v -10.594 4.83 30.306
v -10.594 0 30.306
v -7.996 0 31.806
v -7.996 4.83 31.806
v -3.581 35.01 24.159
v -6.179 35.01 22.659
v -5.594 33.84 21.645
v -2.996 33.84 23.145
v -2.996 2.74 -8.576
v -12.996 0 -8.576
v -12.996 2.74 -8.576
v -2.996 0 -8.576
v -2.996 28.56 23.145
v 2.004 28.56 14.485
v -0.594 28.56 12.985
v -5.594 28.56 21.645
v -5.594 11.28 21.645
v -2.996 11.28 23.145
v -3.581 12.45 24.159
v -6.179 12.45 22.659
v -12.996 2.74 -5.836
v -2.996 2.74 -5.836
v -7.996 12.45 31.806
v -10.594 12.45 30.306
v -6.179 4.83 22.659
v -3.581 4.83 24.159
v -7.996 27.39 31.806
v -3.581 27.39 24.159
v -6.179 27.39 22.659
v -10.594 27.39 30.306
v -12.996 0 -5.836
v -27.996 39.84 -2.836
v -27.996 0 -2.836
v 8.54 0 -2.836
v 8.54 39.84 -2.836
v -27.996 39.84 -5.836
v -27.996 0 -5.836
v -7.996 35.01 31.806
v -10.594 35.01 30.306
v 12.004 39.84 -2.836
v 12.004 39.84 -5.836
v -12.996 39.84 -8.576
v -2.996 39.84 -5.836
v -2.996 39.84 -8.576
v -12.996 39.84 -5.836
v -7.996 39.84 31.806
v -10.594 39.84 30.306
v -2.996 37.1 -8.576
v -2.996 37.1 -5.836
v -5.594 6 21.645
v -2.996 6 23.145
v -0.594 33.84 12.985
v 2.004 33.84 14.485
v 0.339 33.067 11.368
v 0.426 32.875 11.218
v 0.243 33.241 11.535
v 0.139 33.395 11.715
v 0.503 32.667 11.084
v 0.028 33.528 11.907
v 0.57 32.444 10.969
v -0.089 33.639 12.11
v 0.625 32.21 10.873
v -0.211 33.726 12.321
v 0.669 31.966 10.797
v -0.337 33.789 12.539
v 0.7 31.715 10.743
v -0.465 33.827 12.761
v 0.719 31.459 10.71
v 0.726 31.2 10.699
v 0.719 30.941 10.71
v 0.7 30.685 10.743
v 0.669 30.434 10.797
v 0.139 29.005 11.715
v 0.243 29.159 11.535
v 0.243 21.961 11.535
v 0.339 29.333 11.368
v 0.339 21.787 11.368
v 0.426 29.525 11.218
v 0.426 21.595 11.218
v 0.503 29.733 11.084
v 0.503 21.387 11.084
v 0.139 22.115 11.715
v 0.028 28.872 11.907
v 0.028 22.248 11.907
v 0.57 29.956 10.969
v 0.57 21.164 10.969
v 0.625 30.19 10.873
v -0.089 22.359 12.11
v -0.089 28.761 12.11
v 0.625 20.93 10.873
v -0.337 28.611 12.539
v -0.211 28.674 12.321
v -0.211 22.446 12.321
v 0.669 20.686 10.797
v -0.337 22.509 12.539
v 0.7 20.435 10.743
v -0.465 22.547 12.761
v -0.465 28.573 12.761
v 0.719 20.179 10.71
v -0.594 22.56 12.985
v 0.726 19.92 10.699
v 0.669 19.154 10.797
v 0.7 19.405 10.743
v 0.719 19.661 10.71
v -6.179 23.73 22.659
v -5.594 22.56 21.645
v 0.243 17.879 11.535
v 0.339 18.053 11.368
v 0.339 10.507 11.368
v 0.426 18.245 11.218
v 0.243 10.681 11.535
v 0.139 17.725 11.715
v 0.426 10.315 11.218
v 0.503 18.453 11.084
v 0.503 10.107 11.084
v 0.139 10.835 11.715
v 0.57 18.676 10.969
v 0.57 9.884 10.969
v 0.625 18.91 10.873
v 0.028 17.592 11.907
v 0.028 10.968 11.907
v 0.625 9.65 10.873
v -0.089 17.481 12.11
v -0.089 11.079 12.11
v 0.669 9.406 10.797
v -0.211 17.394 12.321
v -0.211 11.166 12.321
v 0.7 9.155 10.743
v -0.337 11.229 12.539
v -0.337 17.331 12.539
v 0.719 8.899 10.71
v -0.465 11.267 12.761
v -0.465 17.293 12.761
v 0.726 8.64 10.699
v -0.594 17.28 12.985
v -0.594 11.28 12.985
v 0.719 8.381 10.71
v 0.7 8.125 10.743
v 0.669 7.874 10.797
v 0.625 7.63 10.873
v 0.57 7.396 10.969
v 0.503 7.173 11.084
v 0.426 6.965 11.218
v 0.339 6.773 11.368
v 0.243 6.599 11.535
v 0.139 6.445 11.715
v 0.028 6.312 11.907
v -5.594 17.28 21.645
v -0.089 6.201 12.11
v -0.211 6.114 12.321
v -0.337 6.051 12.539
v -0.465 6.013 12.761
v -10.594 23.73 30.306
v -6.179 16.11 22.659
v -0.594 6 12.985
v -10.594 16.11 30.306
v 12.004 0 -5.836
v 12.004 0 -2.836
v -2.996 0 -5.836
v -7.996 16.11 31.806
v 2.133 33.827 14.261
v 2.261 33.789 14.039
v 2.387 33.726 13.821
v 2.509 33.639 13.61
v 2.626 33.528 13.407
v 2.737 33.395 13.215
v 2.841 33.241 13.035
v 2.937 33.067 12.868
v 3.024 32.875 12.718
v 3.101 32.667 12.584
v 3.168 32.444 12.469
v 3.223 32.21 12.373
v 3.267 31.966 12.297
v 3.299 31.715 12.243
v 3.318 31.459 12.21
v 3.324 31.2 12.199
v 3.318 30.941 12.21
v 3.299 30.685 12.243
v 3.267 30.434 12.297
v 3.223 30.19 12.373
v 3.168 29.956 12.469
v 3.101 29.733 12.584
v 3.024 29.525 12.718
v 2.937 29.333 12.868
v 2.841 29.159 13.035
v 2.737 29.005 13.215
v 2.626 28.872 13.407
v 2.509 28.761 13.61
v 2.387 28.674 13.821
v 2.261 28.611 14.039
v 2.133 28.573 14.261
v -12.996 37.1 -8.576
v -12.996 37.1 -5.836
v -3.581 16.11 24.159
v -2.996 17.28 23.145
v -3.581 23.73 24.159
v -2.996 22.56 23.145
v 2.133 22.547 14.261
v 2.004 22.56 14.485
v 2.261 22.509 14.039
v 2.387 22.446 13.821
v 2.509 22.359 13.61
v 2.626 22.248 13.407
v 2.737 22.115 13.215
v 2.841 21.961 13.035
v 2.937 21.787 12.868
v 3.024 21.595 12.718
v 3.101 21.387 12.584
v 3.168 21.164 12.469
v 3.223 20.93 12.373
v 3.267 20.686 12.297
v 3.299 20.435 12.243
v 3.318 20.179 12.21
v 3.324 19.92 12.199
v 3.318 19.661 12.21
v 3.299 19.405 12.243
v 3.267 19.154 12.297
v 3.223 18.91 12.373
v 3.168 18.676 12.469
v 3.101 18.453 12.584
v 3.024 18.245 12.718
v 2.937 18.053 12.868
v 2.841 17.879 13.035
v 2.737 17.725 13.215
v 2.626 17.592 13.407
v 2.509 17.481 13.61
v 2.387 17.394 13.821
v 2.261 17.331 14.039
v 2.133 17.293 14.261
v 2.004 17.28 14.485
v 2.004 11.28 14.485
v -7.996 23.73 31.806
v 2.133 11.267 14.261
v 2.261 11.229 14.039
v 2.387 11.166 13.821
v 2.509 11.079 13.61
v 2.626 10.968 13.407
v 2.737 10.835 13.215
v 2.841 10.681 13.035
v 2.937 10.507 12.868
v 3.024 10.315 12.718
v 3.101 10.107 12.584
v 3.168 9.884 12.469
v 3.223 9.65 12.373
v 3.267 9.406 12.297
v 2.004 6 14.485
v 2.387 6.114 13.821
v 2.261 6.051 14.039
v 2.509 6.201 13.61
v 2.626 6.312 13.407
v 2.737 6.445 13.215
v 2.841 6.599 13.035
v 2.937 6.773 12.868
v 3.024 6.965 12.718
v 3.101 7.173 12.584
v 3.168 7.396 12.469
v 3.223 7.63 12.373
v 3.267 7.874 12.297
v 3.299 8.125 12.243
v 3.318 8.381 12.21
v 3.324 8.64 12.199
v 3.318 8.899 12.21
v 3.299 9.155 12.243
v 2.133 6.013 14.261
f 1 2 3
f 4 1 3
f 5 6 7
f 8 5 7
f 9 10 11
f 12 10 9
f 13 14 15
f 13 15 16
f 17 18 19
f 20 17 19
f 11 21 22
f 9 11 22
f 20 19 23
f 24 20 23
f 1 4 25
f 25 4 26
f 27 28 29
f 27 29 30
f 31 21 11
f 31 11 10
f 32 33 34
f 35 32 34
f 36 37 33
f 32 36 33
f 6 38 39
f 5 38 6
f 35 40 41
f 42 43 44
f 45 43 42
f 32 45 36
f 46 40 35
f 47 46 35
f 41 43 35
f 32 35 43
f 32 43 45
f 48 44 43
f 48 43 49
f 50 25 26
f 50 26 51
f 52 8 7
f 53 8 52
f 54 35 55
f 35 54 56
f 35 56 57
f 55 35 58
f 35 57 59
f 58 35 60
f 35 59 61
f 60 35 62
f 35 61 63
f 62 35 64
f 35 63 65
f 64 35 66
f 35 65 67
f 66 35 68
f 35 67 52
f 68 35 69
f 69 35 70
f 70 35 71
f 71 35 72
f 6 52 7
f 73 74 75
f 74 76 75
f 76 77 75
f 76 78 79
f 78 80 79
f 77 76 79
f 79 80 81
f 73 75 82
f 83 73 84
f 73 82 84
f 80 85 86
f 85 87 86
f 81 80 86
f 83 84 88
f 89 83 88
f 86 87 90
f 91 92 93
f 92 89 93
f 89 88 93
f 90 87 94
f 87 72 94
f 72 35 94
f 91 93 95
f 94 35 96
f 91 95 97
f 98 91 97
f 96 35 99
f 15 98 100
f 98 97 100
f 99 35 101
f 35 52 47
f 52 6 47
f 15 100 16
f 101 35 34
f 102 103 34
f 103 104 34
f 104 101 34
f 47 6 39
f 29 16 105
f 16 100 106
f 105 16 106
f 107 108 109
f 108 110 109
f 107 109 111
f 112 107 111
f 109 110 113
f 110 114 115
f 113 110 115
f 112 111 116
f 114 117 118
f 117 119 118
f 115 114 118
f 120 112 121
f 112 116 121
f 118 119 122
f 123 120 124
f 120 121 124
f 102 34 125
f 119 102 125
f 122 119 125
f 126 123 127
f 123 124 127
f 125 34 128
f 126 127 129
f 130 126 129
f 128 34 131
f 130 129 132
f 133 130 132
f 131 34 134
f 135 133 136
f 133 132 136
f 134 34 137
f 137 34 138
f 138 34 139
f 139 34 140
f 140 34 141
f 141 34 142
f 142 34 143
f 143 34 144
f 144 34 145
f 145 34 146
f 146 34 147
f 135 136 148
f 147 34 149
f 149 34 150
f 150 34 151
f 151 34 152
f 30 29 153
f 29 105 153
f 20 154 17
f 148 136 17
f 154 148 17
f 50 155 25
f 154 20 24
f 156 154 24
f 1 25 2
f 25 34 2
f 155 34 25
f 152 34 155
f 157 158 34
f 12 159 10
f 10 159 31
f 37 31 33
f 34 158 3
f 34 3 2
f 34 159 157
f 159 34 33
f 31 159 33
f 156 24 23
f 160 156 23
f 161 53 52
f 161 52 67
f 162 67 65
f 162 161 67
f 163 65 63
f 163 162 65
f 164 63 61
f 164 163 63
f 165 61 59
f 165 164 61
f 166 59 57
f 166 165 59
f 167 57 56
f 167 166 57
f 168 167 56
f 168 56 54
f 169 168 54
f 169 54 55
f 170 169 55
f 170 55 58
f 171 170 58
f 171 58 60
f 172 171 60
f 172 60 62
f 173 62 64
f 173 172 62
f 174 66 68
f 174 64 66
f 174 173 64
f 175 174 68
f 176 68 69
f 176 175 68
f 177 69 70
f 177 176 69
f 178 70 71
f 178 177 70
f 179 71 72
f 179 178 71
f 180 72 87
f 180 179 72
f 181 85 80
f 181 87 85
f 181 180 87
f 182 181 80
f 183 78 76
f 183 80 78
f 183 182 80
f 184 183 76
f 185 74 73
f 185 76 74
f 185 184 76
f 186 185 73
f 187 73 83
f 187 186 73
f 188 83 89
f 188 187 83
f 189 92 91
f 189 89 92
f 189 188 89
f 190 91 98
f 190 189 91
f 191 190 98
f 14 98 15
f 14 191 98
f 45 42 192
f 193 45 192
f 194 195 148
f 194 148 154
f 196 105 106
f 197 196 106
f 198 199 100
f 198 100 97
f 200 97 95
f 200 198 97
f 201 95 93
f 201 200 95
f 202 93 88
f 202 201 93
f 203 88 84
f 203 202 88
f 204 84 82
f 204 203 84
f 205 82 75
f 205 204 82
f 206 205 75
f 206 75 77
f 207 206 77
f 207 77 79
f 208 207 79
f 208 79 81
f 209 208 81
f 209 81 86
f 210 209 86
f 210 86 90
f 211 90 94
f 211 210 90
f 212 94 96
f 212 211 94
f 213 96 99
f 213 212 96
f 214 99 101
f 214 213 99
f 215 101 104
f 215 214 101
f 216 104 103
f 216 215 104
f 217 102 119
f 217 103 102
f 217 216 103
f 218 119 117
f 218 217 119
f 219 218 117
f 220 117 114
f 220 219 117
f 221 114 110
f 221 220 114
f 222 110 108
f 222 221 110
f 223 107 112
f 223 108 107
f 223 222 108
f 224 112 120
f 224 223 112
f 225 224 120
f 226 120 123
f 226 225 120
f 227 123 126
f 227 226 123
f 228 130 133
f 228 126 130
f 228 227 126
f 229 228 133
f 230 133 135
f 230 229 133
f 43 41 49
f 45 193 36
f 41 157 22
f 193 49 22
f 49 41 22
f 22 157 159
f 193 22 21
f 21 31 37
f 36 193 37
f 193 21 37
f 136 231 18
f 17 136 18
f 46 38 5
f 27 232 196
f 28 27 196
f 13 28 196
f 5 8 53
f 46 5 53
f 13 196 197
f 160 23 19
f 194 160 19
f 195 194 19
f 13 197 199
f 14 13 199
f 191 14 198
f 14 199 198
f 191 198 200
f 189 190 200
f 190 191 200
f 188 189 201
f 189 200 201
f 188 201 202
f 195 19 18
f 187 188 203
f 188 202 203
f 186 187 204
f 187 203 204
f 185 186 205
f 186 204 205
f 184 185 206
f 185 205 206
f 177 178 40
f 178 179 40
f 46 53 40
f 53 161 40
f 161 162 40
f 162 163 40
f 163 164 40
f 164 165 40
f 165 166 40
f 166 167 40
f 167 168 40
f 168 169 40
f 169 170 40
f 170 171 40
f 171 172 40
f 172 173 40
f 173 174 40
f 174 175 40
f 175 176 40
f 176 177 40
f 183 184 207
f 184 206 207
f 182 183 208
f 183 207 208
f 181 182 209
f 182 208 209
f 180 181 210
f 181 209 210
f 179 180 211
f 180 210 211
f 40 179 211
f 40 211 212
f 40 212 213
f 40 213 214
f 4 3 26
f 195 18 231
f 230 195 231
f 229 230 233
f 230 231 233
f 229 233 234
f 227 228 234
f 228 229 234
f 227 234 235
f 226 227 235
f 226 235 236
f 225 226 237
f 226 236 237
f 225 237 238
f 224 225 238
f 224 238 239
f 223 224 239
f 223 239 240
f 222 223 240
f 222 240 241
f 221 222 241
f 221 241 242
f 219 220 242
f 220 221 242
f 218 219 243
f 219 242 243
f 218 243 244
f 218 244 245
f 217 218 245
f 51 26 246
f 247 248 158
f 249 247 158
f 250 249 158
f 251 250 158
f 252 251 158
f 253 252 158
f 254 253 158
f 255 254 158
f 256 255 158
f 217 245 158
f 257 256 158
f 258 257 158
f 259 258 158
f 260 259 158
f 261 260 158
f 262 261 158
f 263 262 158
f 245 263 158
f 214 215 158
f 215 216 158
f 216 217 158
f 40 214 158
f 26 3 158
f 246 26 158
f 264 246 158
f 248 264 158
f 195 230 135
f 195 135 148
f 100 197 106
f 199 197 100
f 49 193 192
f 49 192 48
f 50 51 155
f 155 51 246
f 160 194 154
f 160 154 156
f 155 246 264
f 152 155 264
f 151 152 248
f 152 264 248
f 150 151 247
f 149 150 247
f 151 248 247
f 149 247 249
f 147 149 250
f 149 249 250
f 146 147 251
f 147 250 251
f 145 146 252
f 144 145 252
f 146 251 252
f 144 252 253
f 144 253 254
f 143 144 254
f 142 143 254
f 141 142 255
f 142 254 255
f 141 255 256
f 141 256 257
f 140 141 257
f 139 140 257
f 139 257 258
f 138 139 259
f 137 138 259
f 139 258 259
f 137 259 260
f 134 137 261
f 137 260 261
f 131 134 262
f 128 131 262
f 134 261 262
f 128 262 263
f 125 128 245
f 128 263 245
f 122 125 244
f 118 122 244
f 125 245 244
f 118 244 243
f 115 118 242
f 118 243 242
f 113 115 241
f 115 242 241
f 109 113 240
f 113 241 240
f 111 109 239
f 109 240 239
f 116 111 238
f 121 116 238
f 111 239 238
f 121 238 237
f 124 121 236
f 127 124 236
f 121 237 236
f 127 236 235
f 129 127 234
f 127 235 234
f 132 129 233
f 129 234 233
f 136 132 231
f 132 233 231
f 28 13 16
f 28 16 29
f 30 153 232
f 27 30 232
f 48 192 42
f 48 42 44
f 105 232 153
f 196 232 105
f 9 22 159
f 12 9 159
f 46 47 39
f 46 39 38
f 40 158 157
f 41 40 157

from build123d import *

# Parameters (mm, degrees)
BOSS_EXTRUDE1_DEPTH = 39.84
CUT_EXTRUDE1_REACH  = 62.108
SKETCH3_W           = 10
SKETCH3_H           = 2.74
BOSS_EXTRUDE2_DEPTH = 2.74


with BuildPart() as part:
    # Sketch1 → Boss-Extrude1 (new body)
    with BuildSketch(Plane(origin=(0, 0, 0), x_dir=(-1, 0, 0), z_dir=(0, 1, 0))):
        Polygon((-12.003904286, -2.835509232), (-12.003904286, -5.835509232), (27.996095714, -5.835509232), (27.996095714, -2.835509232), (-8.539802671, -2.835509232), (10.594171925, 30.305506919), (7.996095714, 31.805506919), align=None)
    extrude(amount=BOSS_EXTRUDE1_DEPTH)

    # Sketch2 → Cut-Extrude1 (cut, up to next)
    with BuildSketch(Plane(origin=(7.775116701, 0, 4.48896572), x_dir=(0, 1, 0), z_dir=(0.8660254037844364, 0, 0.5000000000000038)), mode=Mode.PRIVATE) as cut_extrude1_sk1:
        with BuildLine():
            Line((6, 21.542424829), (6, 11.542424829))
            ThreePointArc((6, 11.542424829), (8.64, 8.902424829), (11.28, 11.542424829))
            Line((11.28, 11.542424829), (11.28, 21.542424829))
            Line((11.28, 21.542424829), (12.45, 22.712424829))
            Line((12.45, 22.712424829), (12.45, 31.542424829))
            Line((12.45, 31.542424829), (11.28, 31.542424829))
            Line((11.28, 31.542424829), (6, 31.542424829))
            Line((6, 31.542424829), (4.83, 31.542424829))
            Line((4.83, 31.542424829), (4.83, 22.712424829))
            Line((4.83, 22.712424829), (6, 21.542424829))
        make_face()
    cut_extrude1_tool1 = extrude(cut_extrude1_sk1.sketch, amount=-CUT_EXTRUDE1_REACH, mode=Mode.PRIVATE) & part.part
    # Sketch2 → Cut-Extrude1 (cut, up to next)
    with BuildSketch(Plane(origin=(7.775116701, 0, 4.48896572), x_dir=(0, 1, 0), z_dir=(0.8660254037844364, 0, 0.5000000000000038)), mode=Mode.PRIVATE) as cut_extrude1_sk2:
        with BuildLine():
            Line((22.56, 21.542424829), (22.56, 11.542424829))
            ThreePointArc((22.56, 11.542424829), (19.92, 8.902424829), (17.28, 11.542424829))
            Line((17.28, 11.542424829), (17.28, 21.542424829))
            Line((17.28, 21.542424829), (16.11, 22.712424829))
            Line((16.11, 22.712424829), (16.11, 31.542424829))
            Line((16.11, 31.542424829), (17.28, 31.542424829))
            Line((17.28, 31.542424829), (22.56, 31.542424829))
            Line((22.56, 31.542424829), (23.73, 31.542424829))
            Line((23.73, 31.542424829), (23.73, 22.712424829))
            Line((23.73, 22.712424829), (22.56, 21.542424829))
        make_face()
    cut_extrude1_tool2 = extrude(cut_extrude1_sk2.sketch, amount=-CUT_EXTRUDE1_REACH, mode=Mode.PRIVATE) & part.part
    # Sketch2 → Cut-Extrude1 (cut, up to next)
    with BuildSketch(Plane(origin=(7.775116701, 0, 4.48896572), x_dir=(0, 1, 0), z_dir=(0.8660254037844364, 0, 0.5000000000000038)), mode=Mode.PRIVATE) as cut_extrude1_sk3:
        with BuildLine():
            Line((33.84, 21.542424829), (33.84, 11.542424829))
            ThreePointArc((33.84, 11.542424829), (31.2, 8.902424829), (28.56, 11.542424829))
            Line((28.56, 11.542424829), (28.56, 21.542424829))
            Line((28.56, 21.542424829), (27.39, 22.712424829))
            Line((27.39, 22.712424829), (27.39, 31.542424829))
            Line((27.39, 31.542424829), (28.56, 31.542424829))
            Line((28.56, 31.542424829), (33.84, 31.542424829))
            Line((33.84, 31.542424829), (35.01, 31.542424829))
            Line((35.01, 31.542424829), (35.01, 22.712424829))
            Line((35.01, 22.712424829), (33.84, 21.542424829))
        make_face()
    cut_extrude1_tool3 = extrude(cut_extrude1_sk3.sketch, amount=-CUT_EXTRUDE1_REACH, mode=Mode.PRIVATE) & part.part
    add(cut_extrude1_tool1.solids().sort_by_distance((-2.97705, 8.64, 23.112265))[0], mode=Mode.SUBTRACT)
    add(cut_extrude1_tool2.solids().sort_by_distance((-2.97705, 19.92, 23.112265))[0], mode=Mode.SUBTRACT)
    add(cut_extrude1_tool3.solids().sort_by_distance((-2.97705, 31.2, 23.112265))[0], mode=Mode.SUBTRACT)

    # Sketch3 → Boss-Extrude2 (add)
    with BuildSketch(Plane(origin=(0, 0, -5.835509232), x_dir=(1, 0, 0), z_dir=(0, 0, -1))):
        with Locations((-7.996095714, -1.37)):
            Rectangle(SKETCH3_W, SKETCH3_H)
        with Locations((-7.996095714, -38.47)):
            Rectangle(SKETCH3_W, SKETCH3_H)
    extrude(amount=BOSS_EXTRUDE2_DEPTH)


solid = part.part
